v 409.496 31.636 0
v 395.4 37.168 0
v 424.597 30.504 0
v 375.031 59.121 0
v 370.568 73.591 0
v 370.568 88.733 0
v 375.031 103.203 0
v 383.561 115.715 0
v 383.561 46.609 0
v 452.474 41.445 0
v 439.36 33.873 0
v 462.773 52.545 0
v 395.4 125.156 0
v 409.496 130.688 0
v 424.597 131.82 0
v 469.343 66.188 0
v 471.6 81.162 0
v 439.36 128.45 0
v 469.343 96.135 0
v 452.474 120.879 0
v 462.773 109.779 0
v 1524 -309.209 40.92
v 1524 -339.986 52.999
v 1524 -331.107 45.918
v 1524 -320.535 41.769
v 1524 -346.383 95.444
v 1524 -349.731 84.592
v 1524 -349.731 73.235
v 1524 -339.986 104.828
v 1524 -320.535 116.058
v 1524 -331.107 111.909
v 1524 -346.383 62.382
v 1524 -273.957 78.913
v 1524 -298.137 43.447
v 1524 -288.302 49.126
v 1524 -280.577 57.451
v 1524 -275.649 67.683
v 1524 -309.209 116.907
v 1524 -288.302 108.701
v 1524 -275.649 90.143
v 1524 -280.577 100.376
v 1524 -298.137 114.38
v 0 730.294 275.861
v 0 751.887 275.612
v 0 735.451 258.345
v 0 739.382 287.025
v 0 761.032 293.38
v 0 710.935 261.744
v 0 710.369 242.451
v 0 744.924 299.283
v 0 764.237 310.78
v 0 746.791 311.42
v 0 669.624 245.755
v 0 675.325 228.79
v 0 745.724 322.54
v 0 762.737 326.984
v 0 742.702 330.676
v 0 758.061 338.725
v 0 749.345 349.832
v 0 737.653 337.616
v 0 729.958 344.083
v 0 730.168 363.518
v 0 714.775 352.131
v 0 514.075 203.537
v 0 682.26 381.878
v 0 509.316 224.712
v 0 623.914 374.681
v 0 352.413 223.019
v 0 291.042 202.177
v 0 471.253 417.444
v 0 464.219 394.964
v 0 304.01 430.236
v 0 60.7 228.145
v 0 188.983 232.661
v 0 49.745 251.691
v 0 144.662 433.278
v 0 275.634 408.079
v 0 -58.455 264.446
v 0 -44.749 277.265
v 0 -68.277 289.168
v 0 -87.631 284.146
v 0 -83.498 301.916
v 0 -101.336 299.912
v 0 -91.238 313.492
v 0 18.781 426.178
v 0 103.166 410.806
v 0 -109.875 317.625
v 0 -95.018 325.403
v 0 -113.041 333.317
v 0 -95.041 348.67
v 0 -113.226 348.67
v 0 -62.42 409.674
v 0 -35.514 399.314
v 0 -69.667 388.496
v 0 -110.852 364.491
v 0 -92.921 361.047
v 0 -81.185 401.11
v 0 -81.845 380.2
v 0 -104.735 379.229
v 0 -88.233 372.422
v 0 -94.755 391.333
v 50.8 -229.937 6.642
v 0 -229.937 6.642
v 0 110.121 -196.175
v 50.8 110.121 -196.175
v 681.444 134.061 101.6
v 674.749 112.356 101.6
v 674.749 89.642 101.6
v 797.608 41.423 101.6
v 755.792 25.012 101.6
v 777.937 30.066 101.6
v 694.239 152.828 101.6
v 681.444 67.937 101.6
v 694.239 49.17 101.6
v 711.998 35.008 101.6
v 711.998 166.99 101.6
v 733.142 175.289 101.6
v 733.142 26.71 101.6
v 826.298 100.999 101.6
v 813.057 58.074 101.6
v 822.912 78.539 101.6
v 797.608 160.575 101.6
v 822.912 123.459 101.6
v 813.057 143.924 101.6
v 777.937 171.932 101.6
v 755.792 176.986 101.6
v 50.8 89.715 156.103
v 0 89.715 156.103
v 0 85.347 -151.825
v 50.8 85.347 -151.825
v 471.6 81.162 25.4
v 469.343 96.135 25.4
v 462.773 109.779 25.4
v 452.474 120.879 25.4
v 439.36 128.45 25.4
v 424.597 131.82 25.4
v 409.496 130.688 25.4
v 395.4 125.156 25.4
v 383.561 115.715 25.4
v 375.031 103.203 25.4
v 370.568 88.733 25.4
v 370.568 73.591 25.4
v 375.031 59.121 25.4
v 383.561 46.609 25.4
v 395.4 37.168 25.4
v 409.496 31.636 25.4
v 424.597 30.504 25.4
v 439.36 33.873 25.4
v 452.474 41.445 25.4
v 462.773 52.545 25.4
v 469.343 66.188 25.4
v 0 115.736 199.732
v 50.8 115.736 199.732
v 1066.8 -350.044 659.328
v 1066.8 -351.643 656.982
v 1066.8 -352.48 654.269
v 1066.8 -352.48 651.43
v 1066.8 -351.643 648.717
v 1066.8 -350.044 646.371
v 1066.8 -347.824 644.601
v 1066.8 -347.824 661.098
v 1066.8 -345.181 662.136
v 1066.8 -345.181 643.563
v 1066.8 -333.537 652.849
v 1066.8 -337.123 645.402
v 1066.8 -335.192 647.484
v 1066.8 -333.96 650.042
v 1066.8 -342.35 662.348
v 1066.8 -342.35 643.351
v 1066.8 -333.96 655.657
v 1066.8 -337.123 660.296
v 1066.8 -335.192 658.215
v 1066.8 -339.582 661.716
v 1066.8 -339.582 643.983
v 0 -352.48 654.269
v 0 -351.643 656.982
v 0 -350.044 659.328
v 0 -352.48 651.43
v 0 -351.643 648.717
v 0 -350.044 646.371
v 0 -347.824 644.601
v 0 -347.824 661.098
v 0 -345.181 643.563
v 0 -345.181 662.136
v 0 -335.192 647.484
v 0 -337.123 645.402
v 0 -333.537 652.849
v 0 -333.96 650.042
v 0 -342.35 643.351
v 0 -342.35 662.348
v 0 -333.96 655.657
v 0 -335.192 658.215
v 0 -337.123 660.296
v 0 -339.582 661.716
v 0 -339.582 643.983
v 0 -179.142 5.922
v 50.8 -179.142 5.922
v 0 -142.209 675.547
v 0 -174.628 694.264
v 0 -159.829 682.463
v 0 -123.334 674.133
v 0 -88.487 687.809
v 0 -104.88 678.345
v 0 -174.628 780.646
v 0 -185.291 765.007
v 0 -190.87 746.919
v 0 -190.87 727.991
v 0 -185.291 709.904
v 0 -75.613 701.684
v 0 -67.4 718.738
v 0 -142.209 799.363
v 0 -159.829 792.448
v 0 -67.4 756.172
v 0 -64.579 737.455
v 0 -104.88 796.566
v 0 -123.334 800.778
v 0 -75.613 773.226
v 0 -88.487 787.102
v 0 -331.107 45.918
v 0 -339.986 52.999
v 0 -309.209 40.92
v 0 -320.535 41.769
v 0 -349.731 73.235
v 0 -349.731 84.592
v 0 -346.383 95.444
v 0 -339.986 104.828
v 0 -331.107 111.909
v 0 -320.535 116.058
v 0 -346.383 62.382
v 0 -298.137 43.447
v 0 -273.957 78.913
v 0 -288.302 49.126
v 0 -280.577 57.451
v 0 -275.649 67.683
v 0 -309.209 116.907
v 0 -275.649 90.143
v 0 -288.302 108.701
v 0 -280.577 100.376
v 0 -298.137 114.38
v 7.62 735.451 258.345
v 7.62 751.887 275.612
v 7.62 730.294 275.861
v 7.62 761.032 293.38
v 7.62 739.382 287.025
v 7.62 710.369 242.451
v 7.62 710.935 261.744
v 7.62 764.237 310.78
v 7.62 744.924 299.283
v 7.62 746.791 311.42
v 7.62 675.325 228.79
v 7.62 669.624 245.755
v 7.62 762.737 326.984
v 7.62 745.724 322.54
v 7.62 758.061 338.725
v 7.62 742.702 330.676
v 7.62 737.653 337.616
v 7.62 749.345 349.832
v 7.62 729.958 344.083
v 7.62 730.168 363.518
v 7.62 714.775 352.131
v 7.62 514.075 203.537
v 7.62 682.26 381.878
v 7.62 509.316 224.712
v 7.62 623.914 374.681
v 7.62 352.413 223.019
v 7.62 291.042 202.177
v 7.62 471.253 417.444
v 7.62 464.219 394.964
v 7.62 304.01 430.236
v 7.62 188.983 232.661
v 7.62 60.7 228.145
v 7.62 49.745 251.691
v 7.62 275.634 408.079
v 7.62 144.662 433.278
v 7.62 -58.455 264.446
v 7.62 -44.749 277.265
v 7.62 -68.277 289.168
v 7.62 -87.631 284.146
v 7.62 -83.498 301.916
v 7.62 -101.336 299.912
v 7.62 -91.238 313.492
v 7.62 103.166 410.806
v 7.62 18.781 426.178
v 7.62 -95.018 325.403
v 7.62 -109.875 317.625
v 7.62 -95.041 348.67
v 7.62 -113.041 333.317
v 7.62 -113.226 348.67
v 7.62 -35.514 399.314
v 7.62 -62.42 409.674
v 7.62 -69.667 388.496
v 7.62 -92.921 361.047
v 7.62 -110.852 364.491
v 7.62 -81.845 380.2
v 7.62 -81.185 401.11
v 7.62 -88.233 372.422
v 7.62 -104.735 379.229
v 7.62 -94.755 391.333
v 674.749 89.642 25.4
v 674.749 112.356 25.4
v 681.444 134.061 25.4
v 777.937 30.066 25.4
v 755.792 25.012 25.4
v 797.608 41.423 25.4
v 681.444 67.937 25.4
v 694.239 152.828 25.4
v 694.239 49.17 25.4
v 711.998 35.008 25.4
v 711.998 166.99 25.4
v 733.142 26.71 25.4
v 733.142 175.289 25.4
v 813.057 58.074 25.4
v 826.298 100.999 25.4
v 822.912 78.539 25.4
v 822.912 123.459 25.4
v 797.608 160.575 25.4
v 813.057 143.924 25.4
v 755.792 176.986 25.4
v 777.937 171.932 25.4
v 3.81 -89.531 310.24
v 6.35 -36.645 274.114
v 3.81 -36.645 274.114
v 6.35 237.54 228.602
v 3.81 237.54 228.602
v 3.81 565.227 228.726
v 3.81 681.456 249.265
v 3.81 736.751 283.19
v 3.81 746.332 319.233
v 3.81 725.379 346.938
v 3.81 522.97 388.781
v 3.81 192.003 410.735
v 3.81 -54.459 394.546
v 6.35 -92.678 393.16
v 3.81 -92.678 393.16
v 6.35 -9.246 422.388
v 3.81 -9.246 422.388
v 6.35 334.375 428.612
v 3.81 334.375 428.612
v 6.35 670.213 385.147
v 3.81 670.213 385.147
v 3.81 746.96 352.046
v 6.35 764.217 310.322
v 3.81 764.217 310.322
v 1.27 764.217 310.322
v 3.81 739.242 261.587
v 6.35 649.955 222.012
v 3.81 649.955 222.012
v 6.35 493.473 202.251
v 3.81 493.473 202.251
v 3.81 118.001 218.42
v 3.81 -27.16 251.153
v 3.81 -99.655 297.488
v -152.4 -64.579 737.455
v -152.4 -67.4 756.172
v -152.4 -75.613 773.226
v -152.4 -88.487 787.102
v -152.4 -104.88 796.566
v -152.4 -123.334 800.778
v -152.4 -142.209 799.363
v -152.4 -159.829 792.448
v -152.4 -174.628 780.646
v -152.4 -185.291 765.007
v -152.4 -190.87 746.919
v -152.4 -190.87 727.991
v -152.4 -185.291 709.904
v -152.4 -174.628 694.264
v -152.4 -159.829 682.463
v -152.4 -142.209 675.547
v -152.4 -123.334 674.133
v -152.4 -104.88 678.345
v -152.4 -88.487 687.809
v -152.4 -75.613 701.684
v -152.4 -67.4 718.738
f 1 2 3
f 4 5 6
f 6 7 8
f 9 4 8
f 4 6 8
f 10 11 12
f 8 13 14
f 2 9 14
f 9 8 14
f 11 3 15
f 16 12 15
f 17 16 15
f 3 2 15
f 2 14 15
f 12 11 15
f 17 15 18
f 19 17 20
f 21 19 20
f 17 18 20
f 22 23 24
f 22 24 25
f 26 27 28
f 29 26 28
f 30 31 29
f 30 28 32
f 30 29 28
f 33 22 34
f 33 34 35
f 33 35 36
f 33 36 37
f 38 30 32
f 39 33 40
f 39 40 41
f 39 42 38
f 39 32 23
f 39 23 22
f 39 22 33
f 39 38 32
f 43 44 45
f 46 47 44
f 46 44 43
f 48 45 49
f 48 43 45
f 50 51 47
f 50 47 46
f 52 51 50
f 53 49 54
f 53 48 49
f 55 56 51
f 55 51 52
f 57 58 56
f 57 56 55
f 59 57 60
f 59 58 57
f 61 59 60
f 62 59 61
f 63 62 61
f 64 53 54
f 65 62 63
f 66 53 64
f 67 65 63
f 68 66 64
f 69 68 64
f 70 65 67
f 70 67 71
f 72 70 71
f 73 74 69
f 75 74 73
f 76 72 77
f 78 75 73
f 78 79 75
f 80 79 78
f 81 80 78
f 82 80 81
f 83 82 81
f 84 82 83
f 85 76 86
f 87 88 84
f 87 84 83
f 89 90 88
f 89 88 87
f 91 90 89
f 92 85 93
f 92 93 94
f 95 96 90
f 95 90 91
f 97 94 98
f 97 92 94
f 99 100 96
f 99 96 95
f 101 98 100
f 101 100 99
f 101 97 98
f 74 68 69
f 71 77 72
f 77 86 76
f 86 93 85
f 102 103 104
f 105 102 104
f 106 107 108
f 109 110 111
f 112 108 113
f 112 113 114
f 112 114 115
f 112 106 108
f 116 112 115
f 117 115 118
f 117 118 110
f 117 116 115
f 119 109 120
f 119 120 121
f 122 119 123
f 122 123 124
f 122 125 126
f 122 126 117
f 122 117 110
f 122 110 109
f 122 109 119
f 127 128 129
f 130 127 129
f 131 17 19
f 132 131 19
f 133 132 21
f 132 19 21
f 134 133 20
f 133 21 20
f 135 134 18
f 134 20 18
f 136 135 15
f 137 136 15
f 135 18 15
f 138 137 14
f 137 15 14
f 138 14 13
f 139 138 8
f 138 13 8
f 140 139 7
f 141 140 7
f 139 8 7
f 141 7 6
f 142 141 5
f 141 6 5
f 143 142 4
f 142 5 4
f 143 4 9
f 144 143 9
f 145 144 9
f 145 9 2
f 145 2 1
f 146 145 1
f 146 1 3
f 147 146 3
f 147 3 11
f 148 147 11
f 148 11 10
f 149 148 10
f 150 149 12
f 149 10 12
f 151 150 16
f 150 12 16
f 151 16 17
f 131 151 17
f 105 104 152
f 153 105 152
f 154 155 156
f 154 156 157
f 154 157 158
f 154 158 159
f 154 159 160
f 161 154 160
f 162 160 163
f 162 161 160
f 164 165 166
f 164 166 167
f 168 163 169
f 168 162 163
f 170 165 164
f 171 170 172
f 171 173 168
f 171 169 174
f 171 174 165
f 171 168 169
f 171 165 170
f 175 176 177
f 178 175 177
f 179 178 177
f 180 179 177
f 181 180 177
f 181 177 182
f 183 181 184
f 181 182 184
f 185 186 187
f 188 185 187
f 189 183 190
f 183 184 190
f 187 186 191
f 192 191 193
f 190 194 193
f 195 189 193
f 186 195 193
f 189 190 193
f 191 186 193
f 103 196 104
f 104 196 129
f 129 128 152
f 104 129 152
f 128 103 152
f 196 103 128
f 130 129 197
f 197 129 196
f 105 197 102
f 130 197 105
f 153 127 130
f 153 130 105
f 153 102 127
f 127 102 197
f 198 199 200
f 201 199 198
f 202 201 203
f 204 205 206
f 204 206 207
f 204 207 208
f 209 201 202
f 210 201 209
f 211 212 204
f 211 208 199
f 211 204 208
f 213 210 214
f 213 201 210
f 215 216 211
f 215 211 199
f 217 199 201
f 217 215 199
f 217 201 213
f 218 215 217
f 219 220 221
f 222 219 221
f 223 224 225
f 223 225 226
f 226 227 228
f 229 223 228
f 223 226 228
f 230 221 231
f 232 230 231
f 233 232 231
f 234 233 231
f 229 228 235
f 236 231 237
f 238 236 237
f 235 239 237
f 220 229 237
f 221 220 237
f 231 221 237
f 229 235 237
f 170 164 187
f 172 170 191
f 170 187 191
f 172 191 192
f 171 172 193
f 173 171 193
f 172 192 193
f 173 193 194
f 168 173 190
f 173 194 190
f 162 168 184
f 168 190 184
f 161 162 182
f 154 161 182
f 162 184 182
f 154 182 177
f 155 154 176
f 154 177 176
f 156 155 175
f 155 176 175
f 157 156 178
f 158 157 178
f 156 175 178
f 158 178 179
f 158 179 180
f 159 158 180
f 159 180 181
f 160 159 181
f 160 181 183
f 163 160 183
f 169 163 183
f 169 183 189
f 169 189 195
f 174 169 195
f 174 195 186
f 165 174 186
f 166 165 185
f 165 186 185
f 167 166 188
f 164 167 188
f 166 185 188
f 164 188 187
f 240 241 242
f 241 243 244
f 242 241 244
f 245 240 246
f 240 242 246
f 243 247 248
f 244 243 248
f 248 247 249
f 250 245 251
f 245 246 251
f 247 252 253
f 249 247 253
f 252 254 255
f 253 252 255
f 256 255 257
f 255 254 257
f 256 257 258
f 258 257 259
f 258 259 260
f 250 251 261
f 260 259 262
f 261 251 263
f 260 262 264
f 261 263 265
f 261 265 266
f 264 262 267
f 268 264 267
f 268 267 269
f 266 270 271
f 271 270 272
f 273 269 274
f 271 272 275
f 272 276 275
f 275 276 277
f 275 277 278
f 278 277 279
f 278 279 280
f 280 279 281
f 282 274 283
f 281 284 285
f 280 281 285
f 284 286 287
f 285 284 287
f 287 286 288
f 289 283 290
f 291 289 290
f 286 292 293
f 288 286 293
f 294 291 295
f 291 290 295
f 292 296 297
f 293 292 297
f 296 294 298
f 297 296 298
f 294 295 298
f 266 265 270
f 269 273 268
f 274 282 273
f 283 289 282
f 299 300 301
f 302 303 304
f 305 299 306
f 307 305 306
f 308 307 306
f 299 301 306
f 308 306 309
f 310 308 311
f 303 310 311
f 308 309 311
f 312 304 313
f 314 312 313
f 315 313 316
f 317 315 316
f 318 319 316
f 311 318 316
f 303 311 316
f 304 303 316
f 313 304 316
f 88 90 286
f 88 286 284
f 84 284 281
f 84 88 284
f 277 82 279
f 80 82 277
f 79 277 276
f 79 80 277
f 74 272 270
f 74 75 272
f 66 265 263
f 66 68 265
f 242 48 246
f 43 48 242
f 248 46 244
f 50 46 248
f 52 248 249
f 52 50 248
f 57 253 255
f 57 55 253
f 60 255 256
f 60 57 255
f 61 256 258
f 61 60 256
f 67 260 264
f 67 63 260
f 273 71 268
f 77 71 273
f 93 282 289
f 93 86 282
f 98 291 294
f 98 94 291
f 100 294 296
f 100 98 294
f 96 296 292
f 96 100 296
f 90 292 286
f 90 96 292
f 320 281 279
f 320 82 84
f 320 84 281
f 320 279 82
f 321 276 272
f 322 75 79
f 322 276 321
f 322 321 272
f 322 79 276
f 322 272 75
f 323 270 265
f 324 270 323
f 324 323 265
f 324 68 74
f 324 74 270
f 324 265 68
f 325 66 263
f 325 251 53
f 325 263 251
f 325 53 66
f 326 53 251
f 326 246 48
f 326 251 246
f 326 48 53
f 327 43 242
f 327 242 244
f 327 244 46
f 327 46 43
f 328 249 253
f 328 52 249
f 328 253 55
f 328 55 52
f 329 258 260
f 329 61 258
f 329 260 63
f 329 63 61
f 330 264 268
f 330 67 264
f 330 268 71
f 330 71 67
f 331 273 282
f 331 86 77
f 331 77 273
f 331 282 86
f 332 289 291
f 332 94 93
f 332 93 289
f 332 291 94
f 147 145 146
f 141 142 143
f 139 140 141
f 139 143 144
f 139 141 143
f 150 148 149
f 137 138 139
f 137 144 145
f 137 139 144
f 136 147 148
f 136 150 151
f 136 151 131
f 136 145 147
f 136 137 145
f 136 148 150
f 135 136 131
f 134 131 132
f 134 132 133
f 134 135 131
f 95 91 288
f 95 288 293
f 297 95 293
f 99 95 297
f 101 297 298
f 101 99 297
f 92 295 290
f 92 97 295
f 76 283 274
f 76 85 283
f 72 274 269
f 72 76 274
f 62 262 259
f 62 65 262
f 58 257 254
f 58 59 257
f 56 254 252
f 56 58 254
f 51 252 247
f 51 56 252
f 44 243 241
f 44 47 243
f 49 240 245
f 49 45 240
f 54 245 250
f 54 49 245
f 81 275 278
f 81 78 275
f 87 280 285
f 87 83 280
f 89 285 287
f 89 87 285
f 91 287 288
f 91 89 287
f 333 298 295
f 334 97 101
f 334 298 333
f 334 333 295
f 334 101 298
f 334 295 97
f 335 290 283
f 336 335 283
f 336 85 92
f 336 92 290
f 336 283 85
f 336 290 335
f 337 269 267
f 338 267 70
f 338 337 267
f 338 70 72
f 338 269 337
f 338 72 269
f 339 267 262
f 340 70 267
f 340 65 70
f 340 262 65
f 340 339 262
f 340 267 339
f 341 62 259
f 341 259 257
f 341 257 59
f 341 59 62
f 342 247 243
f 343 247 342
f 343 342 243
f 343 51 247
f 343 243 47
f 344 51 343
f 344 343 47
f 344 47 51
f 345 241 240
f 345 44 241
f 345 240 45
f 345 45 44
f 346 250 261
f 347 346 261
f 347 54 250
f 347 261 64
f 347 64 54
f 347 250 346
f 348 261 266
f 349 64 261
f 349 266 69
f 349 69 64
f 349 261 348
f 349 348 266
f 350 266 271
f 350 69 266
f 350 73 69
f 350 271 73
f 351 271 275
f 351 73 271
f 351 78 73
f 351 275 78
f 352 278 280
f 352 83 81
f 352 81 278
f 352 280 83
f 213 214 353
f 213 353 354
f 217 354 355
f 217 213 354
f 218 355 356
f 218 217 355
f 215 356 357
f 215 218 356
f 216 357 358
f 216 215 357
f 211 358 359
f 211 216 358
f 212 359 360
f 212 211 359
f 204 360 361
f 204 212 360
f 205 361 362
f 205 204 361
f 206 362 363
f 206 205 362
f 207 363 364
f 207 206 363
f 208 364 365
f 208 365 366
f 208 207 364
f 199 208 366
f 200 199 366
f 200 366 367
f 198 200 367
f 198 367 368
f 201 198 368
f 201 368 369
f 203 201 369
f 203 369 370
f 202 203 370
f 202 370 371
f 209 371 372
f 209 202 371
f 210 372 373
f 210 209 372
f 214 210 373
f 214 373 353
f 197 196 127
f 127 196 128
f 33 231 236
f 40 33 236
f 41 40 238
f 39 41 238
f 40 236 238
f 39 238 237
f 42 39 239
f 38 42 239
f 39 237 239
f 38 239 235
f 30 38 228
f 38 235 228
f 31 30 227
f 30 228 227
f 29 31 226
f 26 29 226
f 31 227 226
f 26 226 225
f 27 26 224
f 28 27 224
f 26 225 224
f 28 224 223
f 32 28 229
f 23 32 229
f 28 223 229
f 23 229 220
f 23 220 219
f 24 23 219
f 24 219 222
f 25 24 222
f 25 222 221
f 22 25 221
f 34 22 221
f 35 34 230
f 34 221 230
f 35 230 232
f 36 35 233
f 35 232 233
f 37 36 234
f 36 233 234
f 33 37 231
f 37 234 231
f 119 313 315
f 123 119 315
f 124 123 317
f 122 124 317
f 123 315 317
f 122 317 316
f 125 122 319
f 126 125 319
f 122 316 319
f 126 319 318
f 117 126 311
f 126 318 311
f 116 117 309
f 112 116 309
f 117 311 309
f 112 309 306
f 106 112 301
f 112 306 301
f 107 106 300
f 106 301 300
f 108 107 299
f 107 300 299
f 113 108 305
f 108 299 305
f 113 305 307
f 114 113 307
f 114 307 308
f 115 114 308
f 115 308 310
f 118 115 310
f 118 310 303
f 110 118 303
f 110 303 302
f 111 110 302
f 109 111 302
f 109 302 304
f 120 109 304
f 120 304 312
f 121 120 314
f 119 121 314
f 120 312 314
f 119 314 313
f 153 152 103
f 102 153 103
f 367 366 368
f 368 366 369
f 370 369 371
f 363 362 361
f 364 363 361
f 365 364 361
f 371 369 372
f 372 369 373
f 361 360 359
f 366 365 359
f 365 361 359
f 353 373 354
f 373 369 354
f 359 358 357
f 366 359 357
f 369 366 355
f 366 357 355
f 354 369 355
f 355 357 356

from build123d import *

# Parameters (mm, degrees)
F1_DEPTH  = 50.8
F2_R      = 38.1
F3_DEPTH  = 1524
F4_R      = 50.8
F5_DEPTH  = 25.4
F6_R      = 76.2
F7_DEPTH  = 76.2
F9_DEPTH  = 7.62
F10_R     = 63.5
F11_DEPTH = 152.4
F12_R     = 9.525
F13_DEPTH = 1066.8


with BuildPart() as f1:
    # F0 (on Right) → F1 (new body)
    with BuildSketch(Plane.YZ):
        Polygon((115.7364128716, 199.7322355401), (-229.9369479617, 6.6420814406), (110.1207111258, -196.1747534029), align=None)
        Polygon((89.7150008287, 156.102817537), (85.3472328042, -151.8248405298), (-179.1420575972, 5.9215865706), align=None, mode=Mode.SUBTRACT)
    extrude(amount=F1_DEPTH)


with BuildPart() as f3:
    # F2 (on Right) → F3 (new body)
    with BuildSketch(Plane.YZ):
        with Locations((-312.0565116405, 78.9133012295)):
            Circle(F2_R)
    extrude(amount=F3_DEPTH)


with BuildPart() as f5:
    # F4 (on Top) → F5 (new body)
    with BuildSketch(Plane.XY):
        with Locations((420.800358057, 81.1618492007)):
            Circle(F4_R)
    extrude(amount=F5_DEPTH)


with BuildPart() as f7:
    # F6 (on face) → F7 (new body)
    with BuildSketch(Plane.XY.offset(25.4)):
        with Locations((750.0976920128, 100.9990423918)):
            Circle(F6_R)
    extrude(amount=F7_DEPTH)


with BuildPart() as f9:
    # F8 (on Right) → F9 (new body)
    with BuildSketch(Plane.YZ):
        with BuildLine():
            add(Edge.make_bspline(
                [(-113.2260560989, 348.6704528332), (-111.5986476453, 374.7194313417), (-71.8248650959, 465.2150575871), (703.1871731765, 416.6763077226), (779.7119729021, 320.6996757141), (710.9603337595, 169.38478396), (-84.100889713, 201.4618641577), (-115.0118234063, 320.0867164593), (-113.2260560989, 348.6704528332)],
                knots=[0, 0, 0, 0, 0.0986187818, 0.3884566695, 0.4911301447, 0.6023942495, 0.8917848829, 1, 1, 1, 1], degree=3))
        make_face()
        with BuildLine():
            add(Edge.make_bspline(
                [(-95.0410962105, 348.6704528332), (-97.3984842573, 328.2190584594), (-96.86978092, 228.8935596604), (708.6561650669, 190.9179800331), (757.697965788, 321.1197253157), (695.9624369612, 390.6313177774), (-73.6096009289, 440.7201414771), (-92.8641521055, 367.5564154051), (-95.0410962105, 348.6704528332)],
                knots=[0, 0, 0, 0, 0.0953655653, 0.4036646806, 0.5089109387, 0.6050863181, 0.9119340978, 1, 1, 1, 1], degree=3))
        make_face(mode=Mode.SUBTRACT)
    extrude(amount=F9_DEPTH)


with BuildPart() as f11:
    # F10 (on face) → F11 (new body)
    with BuildSketch(Plane.YZ):
        with Locations((-128.0791014433, 737.4552488327)):
            Circle(F10_R)
    extrude(amount=-F11_DEPTH)


with BuildPart() as f13:
    # F12 (on face) → F13 (new body)
    with BuildSketch(Plane.YZ):
        with Locations((-343.0615365505, 652.8494358063)):
            Circle(F12_R)
    extrude(amount=F13_DEPTH)


solid = Compound([f1.part, f3.part, f5.part, f7.part, f9.part, f11.part, f13.part])
